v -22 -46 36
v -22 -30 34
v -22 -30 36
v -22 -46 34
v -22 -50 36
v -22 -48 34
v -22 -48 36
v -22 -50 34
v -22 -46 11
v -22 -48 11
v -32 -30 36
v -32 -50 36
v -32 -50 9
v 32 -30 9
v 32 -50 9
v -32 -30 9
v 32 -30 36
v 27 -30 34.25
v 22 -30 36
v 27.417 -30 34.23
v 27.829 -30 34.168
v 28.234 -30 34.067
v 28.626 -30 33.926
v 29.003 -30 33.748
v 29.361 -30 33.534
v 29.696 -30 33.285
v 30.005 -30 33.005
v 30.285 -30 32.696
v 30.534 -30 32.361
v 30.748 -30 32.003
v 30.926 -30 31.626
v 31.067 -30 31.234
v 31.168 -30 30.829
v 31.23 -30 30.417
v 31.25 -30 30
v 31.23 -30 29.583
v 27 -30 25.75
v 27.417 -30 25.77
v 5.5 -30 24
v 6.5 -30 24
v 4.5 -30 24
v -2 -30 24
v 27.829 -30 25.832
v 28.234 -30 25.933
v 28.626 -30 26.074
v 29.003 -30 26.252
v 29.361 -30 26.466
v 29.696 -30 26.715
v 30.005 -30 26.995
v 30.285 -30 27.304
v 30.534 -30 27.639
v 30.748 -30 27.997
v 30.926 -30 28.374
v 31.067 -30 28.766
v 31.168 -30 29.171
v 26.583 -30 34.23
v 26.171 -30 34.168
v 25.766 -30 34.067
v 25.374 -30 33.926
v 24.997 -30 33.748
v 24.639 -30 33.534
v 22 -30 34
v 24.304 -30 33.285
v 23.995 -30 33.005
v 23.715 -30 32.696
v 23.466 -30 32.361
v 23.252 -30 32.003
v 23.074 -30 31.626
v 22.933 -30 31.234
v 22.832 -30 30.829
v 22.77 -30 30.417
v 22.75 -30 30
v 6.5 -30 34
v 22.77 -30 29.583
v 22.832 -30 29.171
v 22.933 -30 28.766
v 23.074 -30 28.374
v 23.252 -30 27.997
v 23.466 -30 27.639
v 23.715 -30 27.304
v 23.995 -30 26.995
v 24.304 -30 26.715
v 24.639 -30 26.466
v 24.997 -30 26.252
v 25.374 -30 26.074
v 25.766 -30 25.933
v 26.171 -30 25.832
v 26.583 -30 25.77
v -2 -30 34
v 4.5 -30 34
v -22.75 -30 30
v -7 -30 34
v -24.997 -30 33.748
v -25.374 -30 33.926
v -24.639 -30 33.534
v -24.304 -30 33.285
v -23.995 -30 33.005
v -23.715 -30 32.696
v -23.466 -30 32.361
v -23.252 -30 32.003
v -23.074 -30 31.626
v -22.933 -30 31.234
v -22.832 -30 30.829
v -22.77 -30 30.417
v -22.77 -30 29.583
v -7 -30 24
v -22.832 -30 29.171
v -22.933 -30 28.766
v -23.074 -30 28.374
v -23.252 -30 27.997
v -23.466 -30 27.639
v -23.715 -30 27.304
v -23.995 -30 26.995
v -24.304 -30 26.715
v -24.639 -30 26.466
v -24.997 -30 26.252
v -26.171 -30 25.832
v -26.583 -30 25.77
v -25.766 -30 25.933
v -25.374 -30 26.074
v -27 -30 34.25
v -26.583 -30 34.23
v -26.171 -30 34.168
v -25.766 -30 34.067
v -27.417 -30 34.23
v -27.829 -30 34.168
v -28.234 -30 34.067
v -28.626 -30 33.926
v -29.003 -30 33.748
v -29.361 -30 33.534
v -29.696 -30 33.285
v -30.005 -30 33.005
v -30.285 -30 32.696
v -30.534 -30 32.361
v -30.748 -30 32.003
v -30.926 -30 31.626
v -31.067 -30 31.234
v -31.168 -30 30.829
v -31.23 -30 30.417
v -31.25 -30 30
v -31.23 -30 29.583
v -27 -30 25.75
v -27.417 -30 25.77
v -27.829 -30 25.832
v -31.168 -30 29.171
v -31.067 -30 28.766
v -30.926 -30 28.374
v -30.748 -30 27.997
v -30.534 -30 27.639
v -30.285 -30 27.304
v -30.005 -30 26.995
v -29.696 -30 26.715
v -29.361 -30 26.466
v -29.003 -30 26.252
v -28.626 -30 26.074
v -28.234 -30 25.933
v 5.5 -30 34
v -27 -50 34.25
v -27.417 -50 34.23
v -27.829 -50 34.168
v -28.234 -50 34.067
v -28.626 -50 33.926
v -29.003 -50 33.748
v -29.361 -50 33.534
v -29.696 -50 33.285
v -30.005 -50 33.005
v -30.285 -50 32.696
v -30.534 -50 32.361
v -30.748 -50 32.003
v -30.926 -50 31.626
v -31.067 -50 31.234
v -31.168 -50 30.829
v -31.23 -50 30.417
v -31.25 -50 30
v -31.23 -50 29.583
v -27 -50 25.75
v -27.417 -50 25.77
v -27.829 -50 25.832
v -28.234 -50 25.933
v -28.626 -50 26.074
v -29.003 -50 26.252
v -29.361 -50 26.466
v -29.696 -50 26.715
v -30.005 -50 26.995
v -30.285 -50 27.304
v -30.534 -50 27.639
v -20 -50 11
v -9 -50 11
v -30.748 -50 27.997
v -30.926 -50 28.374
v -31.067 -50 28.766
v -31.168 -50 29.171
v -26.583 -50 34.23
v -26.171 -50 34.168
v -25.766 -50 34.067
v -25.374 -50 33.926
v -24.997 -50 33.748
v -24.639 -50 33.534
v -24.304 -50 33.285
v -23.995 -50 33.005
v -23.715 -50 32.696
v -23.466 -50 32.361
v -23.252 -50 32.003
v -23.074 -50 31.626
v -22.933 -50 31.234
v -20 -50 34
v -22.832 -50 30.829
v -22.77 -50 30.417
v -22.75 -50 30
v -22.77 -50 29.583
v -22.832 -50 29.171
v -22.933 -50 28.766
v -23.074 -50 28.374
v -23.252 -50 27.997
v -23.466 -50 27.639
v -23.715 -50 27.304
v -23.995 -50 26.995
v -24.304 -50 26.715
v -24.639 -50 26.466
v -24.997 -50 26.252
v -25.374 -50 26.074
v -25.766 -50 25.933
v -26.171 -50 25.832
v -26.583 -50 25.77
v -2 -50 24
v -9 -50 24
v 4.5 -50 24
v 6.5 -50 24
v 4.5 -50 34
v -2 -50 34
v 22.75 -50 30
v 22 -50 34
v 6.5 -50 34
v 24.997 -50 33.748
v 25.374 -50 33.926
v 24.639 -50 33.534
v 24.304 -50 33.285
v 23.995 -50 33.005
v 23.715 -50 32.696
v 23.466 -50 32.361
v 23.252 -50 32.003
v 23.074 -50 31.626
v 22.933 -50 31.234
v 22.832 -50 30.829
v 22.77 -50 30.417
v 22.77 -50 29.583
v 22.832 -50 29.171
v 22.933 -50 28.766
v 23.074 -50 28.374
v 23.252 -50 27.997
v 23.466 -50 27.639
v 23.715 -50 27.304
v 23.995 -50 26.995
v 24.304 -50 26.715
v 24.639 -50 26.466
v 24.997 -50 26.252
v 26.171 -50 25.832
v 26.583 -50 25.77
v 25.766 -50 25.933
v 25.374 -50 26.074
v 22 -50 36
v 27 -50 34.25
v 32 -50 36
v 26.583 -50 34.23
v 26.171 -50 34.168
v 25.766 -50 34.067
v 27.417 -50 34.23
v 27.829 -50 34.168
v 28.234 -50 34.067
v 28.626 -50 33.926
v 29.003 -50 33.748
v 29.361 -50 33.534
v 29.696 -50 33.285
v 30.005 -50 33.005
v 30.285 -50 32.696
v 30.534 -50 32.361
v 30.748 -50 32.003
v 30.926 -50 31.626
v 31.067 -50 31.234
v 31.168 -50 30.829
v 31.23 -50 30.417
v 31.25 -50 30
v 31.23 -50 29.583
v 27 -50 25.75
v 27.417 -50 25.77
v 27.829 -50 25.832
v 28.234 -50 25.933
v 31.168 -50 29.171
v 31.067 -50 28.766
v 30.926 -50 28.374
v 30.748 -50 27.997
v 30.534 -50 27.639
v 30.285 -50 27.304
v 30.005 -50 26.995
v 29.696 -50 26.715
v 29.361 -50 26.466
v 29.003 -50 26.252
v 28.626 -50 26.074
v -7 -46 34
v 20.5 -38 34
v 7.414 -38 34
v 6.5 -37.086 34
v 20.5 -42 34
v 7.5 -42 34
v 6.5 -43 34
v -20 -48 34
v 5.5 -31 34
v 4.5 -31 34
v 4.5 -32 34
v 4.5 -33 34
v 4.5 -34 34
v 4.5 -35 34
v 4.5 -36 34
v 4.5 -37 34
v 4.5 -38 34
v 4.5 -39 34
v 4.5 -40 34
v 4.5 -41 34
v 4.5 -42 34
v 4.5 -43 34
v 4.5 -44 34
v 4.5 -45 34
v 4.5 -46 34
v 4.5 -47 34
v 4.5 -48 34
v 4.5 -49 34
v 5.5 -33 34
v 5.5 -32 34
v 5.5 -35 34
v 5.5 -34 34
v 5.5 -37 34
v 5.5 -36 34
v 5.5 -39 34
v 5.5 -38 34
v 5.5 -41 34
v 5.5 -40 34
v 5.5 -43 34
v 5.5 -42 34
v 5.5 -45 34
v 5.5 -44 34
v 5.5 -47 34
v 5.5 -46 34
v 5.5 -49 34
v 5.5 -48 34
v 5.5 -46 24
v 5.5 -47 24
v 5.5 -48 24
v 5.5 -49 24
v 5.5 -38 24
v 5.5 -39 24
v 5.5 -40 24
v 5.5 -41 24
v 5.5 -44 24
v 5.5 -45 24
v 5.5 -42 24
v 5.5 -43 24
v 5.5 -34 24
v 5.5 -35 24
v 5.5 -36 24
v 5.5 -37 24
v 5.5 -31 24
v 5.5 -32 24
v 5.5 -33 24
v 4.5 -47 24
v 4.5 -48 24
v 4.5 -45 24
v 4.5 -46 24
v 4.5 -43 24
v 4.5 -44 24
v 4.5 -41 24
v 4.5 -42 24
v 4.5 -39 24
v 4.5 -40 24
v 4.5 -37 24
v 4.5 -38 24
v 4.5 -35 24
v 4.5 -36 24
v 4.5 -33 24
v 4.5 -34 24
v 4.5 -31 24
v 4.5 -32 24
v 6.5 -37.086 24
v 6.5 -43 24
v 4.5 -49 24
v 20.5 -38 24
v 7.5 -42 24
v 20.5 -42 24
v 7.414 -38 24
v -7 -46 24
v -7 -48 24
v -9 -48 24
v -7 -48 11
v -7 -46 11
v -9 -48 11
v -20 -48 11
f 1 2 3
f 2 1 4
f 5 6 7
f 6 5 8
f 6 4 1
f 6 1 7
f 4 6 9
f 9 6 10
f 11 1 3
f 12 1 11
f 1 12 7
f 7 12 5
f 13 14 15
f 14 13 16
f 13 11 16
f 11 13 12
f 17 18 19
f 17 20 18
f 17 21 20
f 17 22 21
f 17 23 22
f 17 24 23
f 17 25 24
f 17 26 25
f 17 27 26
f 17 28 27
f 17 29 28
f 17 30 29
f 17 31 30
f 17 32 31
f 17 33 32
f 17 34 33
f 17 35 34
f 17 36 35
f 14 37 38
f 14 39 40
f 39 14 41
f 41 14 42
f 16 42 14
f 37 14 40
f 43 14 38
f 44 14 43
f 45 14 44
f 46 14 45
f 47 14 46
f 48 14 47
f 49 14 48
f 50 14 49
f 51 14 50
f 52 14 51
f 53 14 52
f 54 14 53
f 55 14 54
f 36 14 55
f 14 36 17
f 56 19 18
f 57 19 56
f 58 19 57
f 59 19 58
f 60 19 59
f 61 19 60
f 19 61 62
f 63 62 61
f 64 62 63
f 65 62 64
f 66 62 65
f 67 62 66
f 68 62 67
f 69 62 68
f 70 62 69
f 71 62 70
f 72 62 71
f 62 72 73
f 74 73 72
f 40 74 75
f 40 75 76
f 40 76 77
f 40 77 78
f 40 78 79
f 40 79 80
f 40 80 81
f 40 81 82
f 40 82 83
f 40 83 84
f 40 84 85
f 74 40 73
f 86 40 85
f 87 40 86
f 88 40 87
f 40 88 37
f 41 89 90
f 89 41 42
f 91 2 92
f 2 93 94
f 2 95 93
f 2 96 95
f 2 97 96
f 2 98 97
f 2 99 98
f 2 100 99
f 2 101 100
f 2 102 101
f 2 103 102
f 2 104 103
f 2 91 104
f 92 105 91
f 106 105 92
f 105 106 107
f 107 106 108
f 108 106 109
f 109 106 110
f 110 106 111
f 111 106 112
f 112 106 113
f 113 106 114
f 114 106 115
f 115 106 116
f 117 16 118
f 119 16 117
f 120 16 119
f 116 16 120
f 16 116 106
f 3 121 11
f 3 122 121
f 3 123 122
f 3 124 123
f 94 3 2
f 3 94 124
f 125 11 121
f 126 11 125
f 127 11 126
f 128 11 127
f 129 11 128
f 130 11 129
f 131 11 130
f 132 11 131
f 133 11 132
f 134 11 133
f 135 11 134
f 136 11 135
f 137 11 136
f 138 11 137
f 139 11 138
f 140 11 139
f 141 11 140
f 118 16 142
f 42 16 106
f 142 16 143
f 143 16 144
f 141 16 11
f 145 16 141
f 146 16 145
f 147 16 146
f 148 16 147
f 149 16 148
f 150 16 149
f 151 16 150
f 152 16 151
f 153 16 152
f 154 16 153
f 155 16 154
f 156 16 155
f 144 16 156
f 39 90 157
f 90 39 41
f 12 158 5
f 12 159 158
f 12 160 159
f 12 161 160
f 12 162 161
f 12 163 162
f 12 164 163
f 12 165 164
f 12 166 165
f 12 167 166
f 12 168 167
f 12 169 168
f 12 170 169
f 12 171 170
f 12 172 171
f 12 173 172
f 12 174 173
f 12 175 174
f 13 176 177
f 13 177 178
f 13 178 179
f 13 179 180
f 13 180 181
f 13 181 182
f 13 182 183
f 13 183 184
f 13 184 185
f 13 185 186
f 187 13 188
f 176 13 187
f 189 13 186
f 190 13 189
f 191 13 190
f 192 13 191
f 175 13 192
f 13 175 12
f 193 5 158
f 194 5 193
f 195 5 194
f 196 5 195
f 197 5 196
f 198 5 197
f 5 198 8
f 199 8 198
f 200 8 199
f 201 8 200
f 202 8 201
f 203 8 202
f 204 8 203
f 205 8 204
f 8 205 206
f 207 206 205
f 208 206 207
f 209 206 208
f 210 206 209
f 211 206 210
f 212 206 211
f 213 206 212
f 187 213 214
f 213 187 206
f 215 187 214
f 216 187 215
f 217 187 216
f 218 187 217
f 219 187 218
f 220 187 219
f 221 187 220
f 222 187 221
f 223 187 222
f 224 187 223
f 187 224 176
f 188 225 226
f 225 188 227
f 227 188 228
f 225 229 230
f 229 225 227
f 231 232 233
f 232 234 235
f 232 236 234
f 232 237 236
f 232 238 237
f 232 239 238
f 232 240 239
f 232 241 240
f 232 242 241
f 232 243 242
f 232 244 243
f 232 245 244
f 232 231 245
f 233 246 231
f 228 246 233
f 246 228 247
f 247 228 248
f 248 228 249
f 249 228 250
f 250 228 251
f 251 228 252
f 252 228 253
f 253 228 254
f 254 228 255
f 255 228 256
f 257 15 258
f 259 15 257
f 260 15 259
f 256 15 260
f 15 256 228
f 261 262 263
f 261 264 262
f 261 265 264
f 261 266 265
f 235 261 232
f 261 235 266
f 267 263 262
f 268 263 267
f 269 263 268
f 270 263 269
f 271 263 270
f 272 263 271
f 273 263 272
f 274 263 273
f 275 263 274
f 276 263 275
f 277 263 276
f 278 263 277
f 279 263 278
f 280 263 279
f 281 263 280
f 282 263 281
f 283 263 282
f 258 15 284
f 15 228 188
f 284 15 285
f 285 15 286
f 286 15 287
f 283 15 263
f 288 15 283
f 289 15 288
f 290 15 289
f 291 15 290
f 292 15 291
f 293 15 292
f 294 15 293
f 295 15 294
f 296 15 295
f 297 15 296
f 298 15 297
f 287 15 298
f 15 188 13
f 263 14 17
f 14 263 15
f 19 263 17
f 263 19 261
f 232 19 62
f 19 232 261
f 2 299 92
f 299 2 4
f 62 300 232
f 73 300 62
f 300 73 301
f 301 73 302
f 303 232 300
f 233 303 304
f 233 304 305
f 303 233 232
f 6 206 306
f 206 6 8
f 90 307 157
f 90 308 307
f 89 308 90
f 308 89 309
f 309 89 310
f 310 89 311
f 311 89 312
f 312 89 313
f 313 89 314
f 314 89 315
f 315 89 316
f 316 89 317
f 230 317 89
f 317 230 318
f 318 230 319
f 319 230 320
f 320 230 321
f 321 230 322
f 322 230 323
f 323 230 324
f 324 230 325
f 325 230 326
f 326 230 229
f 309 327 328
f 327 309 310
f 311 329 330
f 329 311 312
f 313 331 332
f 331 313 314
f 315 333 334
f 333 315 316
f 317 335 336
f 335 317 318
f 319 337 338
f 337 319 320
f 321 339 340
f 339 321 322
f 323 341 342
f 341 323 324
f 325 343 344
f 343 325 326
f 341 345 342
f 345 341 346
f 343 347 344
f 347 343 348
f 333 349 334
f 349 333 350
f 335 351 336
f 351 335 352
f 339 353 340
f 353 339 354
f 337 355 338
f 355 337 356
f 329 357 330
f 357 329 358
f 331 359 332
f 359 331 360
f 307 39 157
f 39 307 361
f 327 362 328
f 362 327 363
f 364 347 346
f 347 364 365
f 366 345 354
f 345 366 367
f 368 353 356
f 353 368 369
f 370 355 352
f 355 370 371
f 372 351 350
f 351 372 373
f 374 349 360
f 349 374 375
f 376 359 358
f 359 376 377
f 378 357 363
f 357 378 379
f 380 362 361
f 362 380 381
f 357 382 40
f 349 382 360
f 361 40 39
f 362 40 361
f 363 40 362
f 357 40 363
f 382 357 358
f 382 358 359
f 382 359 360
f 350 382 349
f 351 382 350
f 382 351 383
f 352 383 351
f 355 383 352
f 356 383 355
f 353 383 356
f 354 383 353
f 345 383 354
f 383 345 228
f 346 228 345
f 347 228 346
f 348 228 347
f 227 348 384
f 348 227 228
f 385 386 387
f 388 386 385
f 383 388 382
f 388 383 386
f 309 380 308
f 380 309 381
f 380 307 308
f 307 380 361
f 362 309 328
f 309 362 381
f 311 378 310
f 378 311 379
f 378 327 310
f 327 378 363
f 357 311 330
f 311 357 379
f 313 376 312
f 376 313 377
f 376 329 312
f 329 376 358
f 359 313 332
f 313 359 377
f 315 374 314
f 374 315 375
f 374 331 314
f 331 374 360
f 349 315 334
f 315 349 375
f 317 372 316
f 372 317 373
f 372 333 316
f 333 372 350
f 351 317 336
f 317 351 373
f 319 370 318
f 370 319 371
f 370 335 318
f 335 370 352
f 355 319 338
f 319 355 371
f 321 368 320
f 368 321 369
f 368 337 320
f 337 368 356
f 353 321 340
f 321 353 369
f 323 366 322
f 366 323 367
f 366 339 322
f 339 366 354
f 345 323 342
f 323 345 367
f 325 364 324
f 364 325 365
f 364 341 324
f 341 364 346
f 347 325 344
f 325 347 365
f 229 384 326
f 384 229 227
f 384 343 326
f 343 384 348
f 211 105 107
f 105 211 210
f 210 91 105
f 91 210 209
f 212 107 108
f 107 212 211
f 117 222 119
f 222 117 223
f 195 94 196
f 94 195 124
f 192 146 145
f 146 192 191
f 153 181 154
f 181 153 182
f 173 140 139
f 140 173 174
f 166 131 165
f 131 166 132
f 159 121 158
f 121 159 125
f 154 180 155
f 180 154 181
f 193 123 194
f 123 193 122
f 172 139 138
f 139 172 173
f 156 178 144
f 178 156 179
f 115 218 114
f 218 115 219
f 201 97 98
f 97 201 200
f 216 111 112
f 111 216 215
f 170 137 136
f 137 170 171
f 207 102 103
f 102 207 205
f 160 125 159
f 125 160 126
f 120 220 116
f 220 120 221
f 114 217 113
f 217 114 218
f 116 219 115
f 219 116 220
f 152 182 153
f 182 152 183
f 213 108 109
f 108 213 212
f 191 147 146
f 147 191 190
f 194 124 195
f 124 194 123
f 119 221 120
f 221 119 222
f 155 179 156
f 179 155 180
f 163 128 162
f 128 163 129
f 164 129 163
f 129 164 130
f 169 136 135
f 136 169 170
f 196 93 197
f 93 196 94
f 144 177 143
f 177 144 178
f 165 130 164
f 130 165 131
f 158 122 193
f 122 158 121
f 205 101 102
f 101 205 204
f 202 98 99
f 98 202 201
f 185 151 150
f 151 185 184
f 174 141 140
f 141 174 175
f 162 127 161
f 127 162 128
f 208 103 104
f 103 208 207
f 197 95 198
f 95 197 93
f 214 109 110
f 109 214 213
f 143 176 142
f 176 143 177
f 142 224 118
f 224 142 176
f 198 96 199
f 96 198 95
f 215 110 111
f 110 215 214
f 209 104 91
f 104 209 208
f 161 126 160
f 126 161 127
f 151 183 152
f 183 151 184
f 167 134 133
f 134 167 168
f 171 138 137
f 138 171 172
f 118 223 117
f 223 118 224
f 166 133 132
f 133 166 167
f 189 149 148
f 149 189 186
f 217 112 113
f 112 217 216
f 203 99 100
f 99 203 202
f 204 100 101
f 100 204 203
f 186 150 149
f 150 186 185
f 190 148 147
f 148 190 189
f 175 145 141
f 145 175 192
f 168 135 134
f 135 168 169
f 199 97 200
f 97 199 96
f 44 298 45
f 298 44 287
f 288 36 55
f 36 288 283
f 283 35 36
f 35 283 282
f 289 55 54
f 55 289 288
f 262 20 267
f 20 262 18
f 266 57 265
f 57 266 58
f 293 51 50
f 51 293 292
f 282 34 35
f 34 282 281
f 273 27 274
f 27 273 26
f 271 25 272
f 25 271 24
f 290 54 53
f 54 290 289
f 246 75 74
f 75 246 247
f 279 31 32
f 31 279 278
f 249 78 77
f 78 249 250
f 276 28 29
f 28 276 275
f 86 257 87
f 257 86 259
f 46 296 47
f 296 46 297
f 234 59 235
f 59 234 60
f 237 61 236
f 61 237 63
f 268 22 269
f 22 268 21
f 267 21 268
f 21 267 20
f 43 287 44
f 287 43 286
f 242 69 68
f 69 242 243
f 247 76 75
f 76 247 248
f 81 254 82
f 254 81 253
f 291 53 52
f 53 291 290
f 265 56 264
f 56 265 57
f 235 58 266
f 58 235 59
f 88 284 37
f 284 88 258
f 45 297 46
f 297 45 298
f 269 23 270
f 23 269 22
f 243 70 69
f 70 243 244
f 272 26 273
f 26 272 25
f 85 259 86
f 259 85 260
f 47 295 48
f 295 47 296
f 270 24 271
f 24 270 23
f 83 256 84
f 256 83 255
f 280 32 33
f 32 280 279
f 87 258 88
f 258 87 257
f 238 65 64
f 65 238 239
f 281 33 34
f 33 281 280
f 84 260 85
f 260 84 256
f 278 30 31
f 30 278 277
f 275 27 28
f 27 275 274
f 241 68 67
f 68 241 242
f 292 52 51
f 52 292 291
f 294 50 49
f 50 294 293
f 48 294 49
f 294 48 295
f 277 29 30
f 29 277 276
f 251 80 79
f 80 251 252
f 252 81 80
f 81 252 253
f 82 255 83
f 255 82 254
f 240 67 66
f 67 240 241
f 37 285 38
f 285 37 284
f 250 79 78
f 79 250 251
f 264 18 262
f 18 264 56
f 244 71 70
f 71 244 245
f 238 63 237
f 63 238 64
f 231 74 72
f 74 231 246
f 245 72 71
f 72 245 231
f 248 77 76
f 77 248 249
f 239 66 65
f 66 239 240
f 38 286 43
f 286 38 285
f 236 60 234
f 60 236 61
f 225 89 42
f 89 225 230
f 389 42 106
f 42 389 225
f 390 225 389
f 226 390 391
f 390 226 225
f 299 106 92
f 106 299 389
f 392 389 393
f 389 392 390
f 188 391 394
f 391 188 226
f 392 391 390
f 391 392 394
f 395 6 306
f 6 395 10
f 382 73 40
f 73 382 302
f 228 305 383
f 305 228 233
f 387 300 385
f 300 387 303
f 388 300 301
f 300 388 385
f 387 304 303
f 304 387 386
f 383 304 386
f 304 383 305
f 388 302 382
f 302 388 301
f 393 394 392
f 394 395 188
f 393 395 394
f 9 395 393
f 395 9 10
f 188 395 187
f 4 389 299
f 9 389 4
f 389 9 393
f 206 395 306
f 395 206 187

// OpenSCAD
w=28.5/2;
w2=31.5-28.5;//17.5x7;
$fn=64;
bh=30;
rh=37;
//translate([0,-80,-0]){motor_end();}
//pully_end();
//translate([0,15,0]){pully_end_tension();}
translate([0,-30,0]){chariault();}
module motor_end(){
difference(){
union(){
translate([-32,-20,-1]){cube([10,40,rh]);}    
translate([22,-20,-1]){cube([10,40,rh]);}
translate([-22,-20,-1]){cube([44,40,20]);}
    
}
motor();
translate([0,0,-1]){cylinder(19,w-2,w-2);}

bracket();
rod_mounts(-27,-20,bh);
rod_mounts(27,-20,bh);
}
}

module pully_end(){
    ps = 4.6/2;
 difference(){   
   union(){  
       translate([-33,-20,-1]){cube([12,10,rh]);}    
translate([21,-20,-1]){cube([12,10,rh]);}
   translate([-22,-20,-1]){cube([44,10,20]);}
   translate([-0,-15,-1]){cylinder(36,ps,ps);}
   }
   rod_mounts(-27,-20,bh);
rod_mounts(27,-20,bh);
 
    rod_mounts(0,-20,10,4.5);
}
    
    
    }
module pully_end_tension(){
    
 difference(){   
   union(){  
   translate([-22,-20,-1]){cube([44,10,20]);}
   translate([-33,-20,-1]){cube([12,10,rh]);}    
translate([21,-20,-1]){cube([12,10,rh]);}
   }rod_mounts(-27,-52,bh);
rod_mounts(27,-52,bh);
    rod_mounts(0,-20,10,10);
}
    
    
    }    
module chariault(){
    hh=24;
difference(){
union(){
translate([-32,-20,9]){cube([10,20,rh-10]);}    
translate([22,-20,9]){cube([10,20,rh-10]);}
translate([-22,-20,9]){cube([44,20,25]);}
    
}
rod_mounts(-27,-20,bh);
rod_mounts(27,-20,bh);
for(y=[0:2:20]){
   translate([4.5,-y,hh]){cube([1,1,10]);} 
    }
   translate([-7,-20,hh]){cube([5,20,10]);}     
   translate([-9,-20,hh]){cube([5,2,10]);}  
    translate([5.5,-20,hh]){cube([1,20,10]);} 
     translate([5.5,-12,hh]){cube([15,4,10]);} 
     translate([6.5,-13,hh]){rotate([0,0,45]){cube([2,1,10]);} }
      translate([7.0,-9,hh]){rotate([0,0,45]){cube([1,2,10]);} }
      translate([-22,-18,11]){cube([15,2,hh+2]);} 
      translate([-20,-20,11]){cube([11,2,hh+2]);} 
}    
 
    
}    
    
module motor(){
difference(){
cylinder(19,w,w);

}    
translate([-17.5/2,31.5/2-7,0]){cube([17.5,8,19]);}
translate([-3,31.5/2-7+5,19-5]){cube([6,7,5]);}
//bracket();
}
//42  d7
module bracket(){
translate([-21+7/2,-7/2,18]){
  difference(){
   union(){
    translate([0,7/2,0]){cylinder(1,7/2,7/2);}
    translate([0,0,0]){cube([42-7,7,1]);}
    translate([42-7,7/2,0]){cylinder(1,7/2,7/2);}
   
   translate([0,7/2,-5]){cylinder(5,1,2);}
   translate([42-7,7/2,-5]){cylinder(5,1,2);}
   }
  }
 }
}

module rod_mounts(x,y,z,rd=8.5){
    rw= rd/2;
   translate([x,y,z]){ rotate([-90,0,0]){cylinder(40,rw,rw);}}
    
    
    }
